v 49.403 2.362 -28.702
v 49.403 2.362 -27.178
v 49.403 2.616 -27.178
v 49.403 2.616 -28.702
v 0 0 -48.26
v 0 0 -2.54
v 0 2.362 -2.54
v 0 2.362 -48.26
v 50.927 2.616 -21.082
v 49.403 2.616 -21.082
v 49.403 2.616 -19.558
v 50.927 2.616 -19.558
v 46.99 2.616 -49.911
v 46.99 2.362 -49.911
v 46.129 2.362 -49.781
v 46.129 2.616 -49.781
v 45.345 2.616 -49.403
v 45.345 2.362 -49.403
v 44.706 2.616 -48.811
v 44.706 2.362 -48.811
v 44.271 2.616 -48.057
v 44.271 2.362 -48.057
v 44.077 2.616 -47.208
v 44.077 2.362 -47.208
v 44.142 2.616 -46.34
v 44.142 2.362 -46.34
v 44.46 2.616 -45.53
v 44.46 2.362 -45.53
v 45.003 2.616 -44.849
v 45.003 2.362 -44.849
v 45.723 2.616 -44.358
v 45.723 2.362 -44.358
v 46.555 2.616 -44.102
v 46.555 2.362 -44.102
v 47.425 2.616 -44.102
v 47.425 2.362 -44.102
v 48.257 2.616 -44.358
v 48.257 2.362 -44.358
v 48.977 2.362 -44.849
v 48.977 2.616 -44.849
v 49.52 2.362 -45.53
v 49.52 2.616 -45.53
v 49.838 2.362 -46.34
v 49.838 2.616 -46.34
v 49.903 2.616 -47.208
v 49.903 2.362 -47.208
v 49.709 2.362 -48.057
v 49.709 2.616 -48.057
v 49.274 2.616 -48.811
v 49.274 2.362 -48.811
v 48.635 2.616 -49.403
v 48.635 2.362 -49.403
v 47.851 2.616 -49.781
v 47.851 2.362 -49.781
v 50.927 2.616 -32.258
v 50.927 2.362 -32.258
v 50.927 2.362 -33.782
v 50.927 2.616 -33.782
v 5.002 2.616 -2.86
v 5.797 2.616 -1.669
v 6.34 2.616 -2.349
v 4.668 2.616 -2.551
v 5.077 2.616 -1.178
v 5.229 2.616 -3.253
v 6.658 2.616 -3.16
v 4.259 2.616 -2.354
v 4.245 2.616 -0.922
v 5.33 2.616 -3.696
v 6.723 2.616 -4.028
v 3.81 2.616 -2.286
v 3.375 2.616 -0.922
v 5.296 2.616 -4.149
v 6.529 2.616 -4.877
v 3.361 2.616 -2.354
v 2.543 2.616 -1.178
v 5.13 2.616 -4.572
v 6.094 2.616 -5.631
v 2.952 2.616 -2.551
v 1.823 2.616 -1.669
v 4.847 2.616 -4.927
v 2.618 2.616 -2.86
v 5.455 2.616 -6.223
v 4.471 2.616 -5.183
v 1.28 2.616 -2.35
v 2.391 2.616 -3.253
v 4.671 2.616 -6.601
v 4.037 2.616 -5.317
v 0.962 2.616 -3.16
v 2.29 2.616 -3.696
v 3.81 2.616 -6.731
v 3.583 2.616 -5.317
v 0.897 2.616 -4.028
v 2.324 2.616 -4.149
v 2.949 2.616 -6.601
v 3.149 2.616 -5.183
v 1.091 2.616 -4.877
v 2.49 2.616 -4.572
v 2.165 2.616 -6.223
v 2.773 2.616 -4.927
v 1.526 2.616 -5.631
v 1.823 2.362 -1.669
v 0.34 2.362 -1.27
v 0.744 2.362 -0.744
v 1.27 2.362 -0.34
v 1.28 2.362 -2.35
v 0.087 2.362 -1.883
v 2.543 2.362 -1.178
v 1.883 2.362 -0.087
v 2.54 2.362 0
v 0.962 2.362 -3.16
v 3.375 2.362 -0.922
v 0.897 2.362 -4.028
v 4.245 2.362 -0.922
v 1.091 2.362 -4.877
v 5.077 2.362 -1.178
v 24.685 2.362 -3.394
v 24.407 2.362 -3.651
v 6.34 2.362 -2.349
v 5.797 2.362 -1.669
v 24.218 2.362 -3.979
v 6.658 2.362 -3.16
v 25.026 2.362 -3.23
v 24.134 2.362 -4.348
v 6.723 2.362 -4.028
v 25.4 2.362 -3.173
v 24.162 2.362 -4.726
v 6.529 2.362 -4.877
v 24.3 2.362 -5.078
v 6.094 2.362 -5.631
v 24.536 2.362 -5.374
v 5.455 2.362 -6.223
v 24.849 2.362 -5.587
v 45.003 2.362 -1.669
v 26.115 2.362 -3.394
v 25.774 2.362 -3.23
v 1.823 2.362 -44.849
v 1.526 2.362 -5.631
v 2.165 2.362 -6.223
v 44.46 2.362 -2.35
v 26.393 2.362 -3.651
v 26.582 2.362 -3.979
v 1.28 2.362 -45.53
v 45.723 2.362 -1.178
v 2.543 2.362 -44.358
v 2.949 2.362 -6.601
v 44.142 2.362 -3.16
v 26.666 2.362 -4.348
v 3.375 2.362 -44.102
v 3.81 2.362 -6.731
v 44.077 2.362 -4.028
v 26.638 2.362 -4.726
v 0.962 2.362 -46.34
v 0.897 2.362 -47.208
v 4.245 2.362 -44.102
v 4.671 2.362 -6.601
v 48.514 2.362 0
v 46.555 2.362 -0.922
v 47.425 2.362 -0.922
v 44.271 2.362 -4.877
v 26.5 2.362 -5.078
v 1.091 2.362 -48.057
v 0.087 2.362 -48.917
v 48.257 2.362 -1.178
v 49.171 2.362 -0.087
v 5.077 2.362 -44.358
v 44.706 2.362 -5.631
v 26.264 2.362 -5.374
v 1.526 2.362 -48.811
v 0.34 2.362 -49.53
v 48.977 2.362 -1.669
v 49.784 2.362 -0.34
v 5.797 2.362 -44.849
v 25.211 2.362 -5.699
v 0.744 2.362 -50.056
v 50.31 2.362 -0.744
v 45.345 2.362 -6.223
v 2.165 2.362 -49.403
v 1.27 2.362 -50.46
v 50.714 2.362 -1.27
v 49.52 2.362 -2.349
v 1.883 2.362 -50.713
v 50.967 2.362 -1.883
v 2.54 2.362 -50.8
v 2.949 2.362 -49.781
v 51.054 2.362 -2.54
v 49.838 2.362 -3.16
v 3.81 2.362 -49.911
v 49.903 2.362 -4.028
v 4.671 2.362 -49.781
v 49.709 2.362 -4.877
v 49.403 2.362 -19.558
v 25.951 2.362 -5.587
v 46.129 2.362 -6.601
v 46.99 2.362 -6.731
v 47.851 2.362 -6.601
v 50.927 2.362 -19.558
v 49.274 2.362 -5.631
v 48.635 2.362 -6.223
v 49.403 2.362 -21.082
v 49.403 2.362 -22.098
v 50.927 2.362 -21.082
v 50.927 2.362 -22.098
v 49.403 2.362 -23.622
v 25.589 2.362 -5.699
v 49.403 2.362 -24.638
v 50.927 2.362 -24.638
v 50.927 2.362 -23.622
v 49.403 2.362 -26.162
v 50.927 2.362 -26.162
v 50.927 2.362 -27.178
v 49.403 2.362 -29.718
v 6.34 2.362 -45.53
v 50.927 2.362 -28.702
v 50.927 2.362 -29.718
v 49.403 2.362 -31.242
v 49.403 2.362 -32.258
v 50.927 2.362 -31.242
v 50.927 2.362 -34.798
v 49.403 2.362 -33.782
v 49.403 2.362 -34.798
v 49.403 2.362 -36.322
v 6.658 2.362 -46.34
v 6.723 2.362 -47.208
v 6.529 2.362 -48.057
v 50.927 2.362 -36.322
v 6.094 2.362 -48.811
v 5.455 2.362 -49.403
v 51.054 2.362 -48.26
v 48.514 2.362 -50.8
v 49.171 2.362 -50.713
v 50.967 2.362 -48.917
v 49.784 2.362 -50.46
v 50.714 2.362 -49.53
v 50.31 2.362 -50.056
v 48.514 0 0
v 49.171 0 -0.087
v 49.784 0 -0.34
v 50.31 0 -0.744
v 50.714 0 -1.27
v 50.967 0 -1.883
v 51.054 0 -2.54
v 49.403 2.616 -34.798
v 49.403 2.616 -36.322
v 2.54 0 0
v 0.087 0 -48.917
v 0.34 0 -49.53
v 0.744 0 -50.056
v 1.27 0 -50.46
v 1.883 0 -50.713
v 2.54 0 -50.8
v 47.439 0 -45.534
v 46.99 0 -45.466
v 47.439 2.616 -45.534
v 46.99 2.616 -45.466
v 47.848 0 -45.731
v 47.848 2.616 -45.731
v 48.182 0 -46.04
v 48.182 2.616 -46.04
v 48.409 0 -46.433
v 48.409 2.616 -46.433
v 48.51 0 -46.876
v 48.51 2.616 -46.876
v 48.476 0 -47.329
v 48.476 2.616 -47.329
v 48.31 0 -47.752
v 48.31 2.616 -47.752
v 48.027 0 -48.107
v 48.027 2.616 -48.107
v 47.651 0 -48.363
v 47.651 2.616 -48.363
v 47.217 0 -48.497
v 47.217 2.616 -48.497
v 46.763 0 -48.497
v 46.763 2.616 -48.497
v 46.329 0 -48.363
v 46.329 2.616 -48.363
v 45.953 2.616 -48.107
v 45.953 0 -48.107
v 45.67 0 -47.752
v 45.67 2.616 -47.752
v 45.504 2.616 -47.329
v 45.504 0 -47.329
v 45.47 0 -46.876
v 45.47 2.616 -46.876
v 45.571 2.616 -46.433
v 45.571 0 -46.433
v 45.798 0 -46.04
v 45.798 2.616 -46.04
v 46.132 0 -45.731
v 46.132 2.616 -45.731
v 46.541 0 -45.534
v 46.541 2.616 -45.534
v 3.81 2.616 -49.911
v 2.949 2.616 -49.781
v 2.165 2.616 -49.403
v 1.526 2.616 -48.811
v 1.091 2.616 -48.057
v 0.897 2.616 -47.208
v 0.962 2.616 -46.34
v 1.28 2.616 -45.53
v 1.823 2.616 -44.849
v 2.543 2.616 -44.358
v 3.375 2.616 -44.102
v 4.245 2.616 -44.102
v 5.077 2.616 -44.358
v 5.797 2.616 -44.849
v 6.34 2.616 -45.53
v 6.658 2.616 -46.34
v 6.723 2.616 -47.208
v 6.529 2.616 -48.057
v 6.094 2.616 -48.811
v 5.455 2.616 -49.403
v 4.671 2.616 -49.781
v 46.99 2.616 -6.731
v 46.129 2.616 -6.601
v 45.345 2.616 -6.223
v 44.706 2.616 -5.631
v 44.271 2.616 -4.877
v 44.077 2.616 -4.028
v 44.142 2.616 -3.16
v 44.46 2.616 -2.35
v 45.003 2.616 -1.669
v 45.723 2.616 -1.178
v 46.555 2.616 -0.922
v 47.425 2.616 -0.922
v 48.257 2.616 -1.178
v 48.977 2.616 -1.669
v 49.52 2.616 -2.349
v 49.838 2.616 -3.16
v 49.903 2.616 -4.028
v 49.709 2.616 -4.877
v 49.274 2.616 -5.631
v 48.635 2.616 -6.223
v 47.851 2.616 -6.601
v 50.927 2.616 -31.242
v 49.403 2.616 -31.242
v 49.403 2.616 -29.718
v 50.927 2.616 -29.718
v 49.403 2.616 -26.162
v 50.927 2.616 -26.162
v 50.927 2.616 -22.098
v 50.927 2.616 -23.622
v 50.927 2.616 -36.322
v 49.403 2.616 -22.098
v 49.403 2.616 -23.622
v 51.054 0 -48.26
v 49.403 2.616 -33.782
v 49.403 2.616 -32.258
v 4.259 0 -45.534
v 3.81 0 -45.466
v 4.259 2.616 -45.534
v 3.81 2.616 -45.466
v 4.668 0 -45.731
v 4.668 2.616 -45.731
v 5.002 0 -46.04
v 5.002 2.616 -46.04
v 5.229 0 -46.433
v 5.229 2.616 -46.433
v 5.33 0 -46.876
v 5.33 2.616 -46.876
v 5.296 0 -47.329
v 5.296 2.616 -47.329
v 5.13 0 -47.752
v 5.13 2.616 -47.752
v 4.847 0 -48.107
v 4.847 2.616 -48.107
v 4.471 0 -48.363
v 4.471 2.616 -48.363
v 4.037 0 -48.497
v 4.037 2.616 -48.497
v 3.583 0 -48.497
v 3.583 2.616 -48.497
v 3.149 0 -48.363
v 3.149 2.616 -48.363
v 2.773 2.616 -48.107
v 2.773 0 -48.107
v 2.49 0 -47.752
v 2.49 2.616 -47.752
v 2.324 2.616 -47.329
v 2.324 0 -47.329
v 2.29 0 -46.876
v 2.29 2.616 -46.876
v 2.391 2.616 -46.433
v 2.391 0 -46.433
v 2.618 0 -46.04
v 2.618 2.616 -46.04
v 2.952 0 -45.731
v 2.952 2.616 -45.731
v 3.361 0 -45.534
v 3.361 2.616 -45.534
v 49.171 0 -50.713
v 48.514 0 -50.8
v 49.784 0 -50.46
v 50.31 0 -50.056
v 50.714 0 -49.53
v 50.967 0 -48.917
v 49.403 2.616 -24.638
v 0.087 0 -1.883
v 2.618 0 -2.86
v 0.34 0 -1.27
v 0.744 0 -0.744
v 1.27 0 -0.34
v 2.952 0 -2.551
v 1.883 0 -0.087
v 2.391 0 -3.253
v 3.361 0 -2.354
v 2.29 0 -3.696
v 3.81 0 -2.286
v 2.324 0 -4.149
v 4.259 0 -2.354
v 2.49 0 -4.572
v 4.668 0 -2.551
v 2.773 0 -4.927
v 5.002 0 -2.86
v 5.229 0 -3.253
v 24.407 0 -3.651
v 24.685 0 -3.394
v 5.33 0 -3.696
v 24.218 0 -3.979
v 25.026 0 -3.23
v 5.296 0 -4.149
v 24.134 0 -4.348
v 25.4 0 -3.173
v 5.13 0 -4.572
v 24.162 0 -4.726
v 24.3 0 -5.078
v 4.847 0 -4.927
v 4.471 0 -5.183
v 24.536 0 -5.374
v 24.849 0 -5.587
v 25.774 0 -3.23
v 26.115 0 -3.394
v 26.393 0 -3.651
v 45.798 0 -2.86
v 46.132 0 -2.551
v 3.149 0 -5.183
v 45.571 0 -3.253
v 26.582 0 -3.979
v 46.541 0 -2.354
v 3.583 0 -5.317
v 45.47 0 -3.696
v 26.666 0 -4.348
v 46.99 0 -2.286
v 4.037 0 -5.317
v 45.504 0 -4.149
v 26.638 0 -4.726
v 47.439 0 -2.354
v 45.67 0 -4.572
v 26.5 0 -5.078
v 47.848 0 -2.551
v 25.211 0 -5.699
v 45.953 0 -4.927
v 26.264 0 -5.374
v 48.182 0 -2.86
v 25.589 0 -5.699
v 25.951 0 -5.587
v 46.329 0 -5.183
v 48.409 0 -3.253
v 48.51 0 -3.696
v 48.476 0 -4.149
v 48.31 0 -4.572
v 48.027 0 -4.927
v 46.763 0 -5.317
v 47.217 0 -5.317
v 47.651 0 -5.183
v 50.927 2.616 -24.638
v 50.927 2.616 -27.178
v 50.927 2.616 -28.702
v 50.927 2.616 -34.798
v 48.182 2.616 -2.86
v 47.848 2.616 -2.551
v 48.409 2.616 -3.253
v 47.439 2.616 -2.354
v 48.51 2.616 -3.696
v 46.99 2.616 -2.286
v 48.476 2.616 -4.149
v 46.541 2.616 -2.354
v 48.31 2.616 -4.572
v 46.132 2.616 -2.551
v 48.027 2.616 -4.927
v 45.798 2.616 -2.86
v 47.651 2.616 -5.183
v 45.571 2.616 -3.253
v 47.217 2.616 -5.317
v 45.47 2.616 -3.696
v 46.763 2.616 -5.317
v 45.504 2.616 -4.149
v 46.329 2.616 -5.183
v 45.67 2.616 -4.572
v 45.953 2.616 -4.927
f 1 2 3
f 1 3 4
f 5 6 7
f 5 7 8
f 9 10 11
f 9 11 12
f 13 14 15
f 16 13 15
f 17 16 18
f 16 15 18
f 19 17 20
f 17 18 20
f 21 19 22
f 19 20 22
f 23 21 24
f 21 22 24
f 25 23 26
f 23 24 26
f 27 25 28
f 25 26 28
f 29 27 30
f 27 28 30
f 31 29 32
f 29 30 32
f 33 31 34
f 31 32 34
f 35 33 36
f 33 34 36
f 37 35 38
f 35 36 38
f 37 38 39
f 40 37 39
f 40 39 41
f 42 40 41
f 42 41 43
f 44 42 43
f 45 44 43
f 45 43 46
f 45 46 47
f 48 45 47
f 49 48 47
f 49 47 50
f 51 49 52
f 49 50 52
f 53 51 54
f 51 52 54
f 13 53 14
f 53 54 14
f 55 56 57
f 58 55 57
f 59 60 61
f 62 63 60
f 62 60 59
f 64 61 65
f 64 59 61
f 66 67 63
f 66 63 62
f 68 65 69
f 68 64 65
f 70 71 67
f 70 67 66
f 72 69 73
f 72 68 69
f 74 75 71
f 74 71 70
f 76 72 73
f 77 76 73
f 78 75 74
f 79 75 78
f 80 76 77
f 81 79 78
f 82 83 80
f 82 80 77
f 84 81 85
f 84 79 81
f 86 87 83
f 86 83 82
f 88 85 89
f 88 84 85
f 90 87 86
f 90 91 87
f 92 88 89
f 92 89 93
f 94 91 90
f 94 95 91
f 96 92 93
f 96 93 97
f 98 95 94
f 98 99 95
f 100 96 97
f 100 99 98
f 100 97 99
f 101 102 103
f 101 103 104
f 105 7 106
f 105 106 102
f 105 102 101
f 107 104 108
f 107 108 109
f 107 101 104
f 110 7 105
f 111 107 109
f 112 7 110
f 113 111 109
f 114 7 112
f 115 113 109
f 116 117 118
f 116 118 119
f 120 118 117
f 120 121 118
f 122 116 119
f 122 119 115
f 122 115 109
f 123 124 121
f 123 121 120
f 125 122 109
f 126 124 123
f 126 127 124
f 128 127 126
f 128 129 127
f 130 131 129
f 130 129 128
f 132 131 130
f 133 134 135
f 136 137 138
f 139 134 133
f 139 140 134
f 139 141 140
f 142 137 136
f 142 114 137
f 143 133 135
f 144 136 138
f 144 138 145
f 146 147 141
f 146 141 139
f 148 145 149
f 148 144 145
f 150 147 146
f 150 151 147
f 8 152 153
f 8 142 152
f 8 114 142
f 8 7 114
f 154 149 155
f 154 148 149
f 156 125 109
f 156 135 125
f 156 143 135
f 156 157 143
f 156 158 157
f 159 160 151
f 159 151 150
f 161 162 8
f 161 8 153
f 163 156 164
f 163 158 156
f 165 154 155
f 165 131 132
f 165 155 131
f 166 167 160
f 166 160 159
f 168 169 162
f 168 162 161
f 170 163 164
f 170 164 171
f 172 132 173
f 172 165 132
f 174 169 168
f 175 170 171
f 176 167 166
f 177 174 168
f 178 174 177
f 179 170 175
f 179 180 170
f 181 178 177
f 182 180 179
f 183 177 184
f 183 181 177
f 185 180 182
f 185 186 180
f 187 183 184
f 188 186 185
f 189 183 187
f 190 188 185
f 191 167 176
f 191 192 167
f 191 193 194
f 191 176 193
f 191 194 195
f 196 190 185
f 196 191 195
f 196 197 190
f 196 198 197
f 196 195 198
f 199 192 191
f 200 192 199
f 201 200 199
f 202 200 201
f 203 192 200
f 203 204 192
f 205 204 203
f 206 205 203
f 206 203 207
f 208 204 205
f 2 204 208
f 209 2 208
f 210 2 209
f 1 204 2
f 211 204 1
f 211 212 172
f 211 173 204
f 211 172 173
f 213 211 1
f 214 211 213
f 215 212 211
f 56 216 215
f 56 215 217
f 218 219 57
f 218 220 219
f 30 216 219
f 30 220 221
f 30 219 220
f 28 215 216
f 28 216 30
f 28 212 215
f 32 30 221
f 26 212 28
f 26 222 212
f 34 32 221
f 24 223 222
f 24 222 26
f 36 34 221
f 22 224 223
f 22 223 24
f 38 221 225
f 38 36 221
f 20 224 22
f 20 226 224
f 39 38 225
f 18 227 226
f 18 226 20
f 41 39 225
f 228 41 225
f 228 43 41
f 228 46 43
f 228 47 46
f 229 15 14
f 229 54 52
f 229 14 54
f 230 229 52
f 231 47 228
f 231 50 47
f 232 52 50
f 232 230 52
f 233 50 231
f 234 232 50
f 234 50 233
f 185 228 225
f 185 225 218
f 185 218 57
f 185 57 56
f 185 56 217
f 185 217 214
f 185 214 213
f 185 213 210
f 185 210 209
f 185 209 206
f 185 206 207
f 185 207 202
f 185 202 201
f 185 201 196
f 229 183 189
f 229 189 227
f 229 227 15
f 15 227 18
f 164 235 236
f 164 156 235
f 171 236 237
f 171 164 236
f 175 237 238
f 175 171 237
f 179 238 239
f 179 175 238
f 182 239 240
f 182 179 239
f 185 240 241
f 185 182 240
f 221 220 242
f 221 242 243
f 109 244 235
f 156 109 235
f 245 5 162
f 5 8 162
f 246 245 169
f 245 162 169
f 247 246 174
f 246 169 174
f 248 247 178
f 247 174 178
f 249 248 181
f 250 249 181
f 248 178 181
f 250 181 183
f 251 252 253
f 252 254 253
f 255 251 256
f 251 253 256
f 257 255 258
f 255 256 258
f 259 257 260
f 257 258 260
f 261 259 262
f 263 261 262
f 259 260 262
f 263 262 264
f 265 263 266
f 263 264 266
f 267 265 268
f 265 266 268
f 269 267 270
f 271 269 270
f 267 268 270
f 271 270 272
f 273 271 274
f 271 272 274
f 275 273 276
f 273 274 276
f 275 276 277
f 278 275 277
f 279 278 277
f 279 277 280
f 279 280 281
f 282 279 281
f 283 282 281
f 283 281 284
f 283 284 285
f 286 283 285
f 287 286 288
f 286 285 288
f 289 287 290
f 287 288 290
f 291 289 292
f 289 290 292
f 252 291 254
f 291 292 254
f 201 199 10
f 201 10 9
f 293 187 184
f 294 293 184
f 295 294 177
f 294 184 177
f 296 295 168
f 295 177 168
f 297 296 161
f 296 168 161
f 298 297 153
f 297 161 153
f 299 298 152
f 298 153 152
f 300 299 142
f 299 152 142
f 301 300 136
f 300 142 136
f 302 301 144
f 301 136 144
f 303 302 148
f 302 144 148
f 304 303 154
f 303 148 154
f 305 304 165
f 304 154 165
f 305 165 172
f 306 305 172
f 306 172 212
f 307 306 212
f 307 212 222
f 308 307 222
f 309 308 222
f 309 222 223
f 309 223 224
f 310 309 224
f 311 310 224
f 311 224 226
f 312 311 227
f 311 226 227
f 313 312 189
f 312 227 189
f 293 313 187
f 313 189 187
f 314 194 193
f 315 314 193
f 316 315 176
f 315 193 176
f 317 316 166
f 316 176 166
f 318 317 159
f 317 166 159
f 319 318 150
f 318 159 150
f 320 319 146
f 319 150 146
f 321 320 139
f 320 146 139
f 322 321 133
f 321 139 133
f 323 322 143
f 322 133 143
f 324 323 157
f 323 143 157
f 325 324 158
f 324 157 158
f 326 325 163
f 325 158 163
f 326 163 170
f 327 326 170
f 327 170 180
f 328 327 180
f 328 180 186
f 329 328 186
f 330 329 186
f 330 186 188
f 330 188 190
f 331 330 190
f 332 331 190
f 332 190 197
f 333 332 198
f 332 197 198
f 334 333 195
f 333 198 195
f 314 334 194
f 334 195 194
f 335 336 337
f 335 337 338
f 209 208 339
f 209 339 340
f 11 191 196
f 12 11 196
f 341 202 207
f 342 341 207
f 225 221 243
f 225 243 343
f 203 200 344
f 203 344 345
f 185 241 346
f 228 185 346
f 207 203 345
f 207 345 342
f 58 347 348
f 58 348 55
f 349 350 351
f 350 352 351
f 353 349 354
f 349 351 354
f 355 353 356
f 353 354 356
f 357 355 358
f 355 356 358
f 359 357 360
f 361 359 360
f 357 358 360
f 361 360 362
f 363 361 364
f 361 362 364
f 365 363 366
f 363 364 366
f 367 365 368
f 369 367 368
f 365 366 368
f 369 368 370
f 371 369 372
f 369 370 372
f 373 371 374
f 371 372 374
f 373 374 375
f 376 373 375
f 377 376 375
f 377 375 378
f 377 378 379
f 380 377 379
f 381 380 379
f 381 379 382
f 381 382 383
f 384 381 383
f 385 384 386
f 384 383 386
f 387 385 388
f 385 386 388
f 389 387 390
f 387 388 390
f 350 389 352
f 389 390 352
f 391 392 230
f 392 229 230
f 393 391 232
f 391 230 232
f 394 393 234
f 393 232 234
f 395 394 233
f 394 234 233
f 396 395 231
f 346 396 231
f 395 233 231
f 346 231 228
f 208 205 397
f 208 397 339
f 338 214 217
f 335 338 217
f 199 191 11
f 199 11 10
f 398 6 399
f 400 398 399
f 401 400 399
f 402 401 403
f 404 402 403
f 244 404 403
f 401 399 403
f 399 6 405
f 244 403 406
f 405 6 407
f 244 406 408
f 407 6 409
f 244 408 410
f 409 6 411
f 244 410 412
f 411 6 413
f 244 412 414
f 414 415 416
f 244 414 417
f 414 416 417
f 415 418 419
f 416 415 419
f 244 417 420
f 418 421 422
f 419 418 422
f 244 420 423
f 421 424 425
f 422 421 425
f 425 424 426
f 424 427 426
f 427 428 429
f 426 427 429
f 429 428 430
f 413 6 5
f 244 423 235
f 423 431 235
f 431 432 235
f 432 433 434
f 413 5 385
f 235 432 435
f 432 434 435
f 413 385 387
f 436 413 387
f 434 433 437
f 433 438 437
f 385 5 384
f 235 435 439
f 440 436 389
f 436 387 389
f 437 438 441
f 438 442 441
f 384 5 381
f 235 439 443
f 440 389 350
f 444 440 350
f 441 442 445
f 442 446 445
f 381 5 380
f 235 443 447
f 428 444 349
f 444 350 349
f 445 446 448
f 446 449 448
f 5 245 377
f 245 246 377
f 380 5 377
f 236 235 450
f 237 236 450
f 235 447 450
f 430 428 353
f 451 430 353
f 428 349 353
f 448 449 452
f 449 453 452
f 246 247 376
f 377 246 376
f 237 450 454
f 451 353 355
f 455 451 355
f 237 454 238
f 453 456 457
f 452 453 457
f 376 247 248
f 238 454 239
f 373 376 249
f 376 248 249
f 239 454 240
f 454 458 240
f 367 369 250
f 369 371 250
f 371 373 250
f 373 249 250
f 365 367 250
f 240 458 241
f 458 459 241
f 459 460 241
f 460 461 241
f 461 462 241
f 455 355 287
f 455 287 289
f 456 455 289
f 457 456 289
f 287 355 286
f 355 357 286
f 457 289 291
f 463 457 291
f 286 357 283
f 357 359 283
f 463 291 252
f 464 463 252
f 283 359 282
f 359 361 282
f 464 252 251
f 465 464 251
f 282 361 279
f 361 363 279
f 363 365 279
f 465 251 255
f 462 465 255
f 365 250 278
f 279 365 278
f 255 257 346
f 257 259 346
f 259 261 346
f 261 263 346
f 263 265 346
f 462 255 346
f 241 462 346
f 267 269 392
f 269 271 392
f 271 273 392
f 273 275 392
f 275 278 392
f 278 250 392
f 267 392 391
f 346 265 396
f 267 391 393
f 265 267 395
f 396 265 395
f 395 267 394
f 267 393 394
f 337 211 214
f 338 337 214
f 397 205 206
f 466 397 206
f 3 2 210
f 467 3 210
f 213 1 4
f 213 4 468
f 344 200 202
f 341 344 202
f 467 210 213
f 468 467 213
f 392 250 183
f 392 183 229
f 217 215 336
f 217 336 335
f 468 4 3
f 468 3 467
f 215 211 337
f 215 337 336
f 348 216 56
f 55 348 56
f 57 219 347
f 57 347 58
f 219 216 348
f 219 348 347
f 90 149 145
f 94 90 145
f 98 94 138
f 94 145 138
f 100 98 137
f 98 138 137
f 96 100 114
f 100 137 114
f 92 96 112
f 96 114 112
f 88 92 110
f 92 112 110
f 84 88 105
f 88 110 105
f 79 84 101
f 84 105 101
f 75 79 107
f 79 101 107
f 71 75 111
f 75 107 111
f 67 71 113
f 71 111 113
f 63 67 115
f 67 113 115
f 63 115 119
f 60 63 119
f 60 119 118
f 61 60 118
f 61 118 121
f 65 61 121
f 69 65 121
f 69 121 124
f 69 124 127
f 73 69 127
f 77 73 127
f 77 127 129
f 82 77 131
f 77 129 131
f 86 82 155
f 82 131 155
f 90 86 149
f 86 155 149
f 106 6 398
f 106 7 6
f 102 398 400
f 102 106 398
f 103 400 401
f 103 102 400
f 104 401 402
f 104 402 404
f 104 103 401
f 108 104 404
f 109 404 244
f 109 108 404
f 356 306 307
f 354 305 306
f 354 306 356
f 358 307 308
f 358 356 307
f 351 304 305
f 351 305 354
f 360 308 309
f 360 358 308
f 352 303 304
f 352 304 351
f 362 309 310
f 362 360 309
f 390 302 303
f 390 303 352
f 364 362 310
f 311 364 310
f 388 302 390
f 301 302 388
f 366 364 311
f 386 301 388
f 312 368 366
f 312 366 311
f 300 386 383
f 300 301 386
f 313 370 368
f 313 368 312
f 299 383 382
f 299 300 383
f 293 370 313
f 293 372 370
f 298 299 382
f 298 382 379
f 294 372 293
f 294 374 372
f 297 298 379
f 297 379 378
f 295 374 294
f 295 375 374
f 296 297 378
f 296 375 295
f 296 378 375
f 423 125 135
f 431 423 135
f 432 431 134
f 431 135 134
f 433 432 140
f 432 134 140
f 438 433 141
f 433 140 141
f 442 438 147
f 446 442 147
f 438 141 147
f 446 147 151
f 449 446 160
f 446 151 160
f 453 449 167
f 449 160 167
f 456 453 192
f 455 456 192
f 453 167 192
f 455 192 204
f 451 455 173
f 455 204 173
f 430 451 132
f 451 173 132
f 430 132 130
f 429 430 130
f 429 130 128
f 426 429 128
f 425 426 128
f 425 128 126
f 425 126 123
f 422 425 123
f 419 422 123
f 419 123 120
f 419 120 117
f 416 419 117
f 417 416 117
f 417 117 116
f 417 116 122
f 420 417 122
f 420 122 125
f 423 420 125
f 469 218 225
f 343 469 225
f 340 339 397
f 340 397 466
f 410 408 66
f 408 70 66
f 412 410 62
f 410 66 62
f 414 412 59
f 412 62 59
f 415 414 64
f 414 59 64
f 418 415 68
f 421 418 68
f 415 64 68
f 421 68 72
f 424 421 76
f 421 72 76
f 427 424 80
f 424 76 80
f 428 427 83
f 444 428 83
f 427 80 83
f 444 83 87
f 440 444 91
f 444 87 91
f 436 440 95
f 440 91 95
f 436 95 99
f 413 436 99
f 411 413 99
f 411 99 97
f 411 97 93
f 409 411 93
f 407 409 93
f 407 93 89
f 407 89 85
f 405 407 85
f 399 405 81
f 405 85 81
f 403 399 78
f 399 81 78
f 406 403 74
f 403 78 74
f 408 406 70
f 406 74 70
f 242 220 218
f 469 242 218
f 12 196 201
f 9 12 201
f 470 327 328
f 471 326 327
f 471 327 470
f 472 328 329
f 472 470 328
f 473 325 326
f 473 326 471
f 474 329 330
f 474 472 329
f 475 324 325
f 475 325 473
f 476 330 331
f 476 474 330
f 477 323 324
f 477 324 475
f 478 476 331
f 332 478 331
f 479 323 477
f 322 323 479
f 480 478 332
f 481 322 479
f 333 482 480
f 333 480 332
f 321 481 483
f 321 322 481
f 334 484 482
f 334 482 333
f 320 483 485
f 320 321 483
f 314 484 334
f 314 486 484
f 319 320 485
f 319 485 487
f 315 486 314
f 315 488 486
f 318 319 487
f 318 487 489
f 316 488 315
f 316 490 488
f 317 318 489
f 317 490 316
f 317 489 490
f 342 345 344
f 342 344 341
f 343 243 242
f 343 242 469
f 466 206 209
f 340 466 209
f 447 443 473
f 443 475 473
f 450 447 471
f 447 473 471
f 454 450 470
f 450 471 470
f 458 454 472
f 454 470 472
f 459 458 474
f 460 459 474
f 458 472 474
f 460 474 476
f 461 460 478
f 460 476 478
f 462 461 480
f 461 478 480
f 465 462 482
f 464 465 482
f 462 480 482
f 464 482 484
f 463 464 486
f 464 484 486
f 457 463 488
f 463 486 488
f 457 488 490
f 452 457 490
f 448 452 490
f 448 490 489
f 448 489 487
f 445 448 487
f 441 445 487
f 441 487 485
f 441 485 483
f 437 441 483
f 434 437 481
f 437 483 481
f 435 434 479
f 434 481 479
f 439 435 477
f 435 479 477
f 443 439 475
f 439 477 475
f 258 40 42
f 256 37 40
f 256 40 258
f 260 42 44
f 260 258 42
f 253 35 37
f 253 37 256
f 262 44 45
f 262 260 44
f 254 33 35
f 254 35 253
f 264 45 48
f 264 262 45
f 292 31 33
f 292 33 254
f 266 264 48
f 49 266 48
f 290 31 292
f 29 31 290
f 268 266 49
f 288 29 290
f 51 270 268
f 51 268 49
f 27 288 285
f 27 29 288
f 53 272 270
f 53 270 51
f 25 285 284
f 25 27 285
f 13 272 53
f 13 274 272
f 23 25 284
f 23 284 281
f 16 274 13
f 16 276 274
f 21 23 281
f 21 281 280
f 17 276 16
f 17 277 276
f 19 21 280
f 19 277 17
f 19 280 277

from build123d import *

# Parameters (mm, degrees)
SKETCH1_W            = 51.054
SKETCH1_H            = 50.8
BOSS_EXTRUDE1_DEPTH  = 2.3622
SKETCH5_R            = 2.921
BOSS_EXTRUDE3_DEPTH  = 0.254
SKETCH2_R            = 1.524
CUT_EXTRUDE1_DEPTH   = 73.060605776
LPATTERN1_COUNT      = 2
LPATTERN1_PITCH      = 43.18
LPATTERN1_COUNT_DIR2 = 2
LPATTERN1_PITCH_DIR2 = 43.18
FILLET1_R            = 2.54
SKETCH3_R            = 1.27
CUT_EXTRUDE2_DEPTH   = 73.060605776
SKETCH6_W            = 1.524
SKETCH6_H            = 1.524
BOSS_EXTRUDE4_DEPTH  = 0.254
LPATTERN2_COUNT      = 7
LPATTERN2_PITCH      = 2.54


with BuildPart() as part:
    # Sketch1 → Boss-Extrude1 (new body)
    with BuildSketch(Plane(origin=(0, 0, 0), x_dir=(1, 0, 0), z_dir=(0, 1, 0))):
        with Locations((25.527, 25.4)):
            Rectangle(SKETCH1_W, SKETCH1_H)
    extrude(amount=BOSS_EXTRUDE1_DEPTH)

    # Sketch5 → Boss-Extrude3 (add)
    with BuildSketch(Plane(origin=(0, 2.3622, 0), x_dir=(1, 0, 0), z_dir=(0, 1, 0))):
        with Locations(Location((3.81, 3.81, 0), (0, 0, 90))):
            Circle(SKETCH5_R)
    boss_extrude3 = extrude(amount=BOSS_EXTRUDE3_DEPTH)

    # Sketch2 → Cut-Extrude1 (cut, symmetric)
    with BuildSketch(Plane(origin=(0, 2.3622, 0), x_dir=(1, 0, 0), z_dir=(0, 1, 0))):
        with Locations(Location((3.81, 3.81, 0), (0, 0, 270))):
            Circle(SKETCH2_R)
    cut_extrude1 = extrude(amount=CUT_EXTRUDE1_DEPTH, both=True, mode=Mode.SUBTRACT)

    # LPattern1: Boss-Extrude3, Cut-Extrude1 2 × 2
    with Locations(*[(j * LPATTERN1_PITCH_DIR2, 0, -i * LPATTERN1_PITCH) for i in range(LPATTERN1_COUNT) for j in range(LPATTERN1_COUNT_DIR2) if (i, j) != (0, 0)]):
        add(boss_extrude3)
        add(cut_extrude1, mode=Mode.SUBTRACT)

    # Fillet1
    fillet1_edges = [part.edges().sort_by_distance(p)[0] for p in [
        (0, 1.1811, -50.8),
        (51.054, 1.1811, -50.8),
        (51.054, 1.1811, 0),
        (0, 1.1811, 0),
    ]]
    fillet(fillet1_edges, radius=FILLET1_R)

    # Sketch3 → Cut-Extrude2 (cut, through all)
    with BuildSketch(Plane(origin=(0, 2.3622, 0), x_dir=(1, 0, 0), z_dir=(0, 1, 0))):
        with Locations(Location((25.4, 4.443185344, 0), (0, 0, 270))):
            Circle(SKETCH3_R)
    extrude(amount=-CUT_EXTRUDE2_DEPTH, mode=Mode.SUBTRACT)

    # Sketch6 → Boss-Extrude4 (add)
    with BuildSketch(Plane(origin=(0, 2.3622, 0), x_dir=(1, 0, 0), z_dir=(0, 1, 0))):
        with Locations((50.165, 35.56)):
            Rectangle(SKETCH6_W, SKETCH6_H)
    boss_extrude4 = extrude(amount=BOSS_EXTRUDE4_DEPTH)

    # LPattern2: Boss-Extrude4 ×7
    with Locations(*[(0, 0, i * LPATTERN2_PITCH) for i in range(1, LPATTERN2_COUNT)]):
        add(boss_extrude4)


solid = part.part
